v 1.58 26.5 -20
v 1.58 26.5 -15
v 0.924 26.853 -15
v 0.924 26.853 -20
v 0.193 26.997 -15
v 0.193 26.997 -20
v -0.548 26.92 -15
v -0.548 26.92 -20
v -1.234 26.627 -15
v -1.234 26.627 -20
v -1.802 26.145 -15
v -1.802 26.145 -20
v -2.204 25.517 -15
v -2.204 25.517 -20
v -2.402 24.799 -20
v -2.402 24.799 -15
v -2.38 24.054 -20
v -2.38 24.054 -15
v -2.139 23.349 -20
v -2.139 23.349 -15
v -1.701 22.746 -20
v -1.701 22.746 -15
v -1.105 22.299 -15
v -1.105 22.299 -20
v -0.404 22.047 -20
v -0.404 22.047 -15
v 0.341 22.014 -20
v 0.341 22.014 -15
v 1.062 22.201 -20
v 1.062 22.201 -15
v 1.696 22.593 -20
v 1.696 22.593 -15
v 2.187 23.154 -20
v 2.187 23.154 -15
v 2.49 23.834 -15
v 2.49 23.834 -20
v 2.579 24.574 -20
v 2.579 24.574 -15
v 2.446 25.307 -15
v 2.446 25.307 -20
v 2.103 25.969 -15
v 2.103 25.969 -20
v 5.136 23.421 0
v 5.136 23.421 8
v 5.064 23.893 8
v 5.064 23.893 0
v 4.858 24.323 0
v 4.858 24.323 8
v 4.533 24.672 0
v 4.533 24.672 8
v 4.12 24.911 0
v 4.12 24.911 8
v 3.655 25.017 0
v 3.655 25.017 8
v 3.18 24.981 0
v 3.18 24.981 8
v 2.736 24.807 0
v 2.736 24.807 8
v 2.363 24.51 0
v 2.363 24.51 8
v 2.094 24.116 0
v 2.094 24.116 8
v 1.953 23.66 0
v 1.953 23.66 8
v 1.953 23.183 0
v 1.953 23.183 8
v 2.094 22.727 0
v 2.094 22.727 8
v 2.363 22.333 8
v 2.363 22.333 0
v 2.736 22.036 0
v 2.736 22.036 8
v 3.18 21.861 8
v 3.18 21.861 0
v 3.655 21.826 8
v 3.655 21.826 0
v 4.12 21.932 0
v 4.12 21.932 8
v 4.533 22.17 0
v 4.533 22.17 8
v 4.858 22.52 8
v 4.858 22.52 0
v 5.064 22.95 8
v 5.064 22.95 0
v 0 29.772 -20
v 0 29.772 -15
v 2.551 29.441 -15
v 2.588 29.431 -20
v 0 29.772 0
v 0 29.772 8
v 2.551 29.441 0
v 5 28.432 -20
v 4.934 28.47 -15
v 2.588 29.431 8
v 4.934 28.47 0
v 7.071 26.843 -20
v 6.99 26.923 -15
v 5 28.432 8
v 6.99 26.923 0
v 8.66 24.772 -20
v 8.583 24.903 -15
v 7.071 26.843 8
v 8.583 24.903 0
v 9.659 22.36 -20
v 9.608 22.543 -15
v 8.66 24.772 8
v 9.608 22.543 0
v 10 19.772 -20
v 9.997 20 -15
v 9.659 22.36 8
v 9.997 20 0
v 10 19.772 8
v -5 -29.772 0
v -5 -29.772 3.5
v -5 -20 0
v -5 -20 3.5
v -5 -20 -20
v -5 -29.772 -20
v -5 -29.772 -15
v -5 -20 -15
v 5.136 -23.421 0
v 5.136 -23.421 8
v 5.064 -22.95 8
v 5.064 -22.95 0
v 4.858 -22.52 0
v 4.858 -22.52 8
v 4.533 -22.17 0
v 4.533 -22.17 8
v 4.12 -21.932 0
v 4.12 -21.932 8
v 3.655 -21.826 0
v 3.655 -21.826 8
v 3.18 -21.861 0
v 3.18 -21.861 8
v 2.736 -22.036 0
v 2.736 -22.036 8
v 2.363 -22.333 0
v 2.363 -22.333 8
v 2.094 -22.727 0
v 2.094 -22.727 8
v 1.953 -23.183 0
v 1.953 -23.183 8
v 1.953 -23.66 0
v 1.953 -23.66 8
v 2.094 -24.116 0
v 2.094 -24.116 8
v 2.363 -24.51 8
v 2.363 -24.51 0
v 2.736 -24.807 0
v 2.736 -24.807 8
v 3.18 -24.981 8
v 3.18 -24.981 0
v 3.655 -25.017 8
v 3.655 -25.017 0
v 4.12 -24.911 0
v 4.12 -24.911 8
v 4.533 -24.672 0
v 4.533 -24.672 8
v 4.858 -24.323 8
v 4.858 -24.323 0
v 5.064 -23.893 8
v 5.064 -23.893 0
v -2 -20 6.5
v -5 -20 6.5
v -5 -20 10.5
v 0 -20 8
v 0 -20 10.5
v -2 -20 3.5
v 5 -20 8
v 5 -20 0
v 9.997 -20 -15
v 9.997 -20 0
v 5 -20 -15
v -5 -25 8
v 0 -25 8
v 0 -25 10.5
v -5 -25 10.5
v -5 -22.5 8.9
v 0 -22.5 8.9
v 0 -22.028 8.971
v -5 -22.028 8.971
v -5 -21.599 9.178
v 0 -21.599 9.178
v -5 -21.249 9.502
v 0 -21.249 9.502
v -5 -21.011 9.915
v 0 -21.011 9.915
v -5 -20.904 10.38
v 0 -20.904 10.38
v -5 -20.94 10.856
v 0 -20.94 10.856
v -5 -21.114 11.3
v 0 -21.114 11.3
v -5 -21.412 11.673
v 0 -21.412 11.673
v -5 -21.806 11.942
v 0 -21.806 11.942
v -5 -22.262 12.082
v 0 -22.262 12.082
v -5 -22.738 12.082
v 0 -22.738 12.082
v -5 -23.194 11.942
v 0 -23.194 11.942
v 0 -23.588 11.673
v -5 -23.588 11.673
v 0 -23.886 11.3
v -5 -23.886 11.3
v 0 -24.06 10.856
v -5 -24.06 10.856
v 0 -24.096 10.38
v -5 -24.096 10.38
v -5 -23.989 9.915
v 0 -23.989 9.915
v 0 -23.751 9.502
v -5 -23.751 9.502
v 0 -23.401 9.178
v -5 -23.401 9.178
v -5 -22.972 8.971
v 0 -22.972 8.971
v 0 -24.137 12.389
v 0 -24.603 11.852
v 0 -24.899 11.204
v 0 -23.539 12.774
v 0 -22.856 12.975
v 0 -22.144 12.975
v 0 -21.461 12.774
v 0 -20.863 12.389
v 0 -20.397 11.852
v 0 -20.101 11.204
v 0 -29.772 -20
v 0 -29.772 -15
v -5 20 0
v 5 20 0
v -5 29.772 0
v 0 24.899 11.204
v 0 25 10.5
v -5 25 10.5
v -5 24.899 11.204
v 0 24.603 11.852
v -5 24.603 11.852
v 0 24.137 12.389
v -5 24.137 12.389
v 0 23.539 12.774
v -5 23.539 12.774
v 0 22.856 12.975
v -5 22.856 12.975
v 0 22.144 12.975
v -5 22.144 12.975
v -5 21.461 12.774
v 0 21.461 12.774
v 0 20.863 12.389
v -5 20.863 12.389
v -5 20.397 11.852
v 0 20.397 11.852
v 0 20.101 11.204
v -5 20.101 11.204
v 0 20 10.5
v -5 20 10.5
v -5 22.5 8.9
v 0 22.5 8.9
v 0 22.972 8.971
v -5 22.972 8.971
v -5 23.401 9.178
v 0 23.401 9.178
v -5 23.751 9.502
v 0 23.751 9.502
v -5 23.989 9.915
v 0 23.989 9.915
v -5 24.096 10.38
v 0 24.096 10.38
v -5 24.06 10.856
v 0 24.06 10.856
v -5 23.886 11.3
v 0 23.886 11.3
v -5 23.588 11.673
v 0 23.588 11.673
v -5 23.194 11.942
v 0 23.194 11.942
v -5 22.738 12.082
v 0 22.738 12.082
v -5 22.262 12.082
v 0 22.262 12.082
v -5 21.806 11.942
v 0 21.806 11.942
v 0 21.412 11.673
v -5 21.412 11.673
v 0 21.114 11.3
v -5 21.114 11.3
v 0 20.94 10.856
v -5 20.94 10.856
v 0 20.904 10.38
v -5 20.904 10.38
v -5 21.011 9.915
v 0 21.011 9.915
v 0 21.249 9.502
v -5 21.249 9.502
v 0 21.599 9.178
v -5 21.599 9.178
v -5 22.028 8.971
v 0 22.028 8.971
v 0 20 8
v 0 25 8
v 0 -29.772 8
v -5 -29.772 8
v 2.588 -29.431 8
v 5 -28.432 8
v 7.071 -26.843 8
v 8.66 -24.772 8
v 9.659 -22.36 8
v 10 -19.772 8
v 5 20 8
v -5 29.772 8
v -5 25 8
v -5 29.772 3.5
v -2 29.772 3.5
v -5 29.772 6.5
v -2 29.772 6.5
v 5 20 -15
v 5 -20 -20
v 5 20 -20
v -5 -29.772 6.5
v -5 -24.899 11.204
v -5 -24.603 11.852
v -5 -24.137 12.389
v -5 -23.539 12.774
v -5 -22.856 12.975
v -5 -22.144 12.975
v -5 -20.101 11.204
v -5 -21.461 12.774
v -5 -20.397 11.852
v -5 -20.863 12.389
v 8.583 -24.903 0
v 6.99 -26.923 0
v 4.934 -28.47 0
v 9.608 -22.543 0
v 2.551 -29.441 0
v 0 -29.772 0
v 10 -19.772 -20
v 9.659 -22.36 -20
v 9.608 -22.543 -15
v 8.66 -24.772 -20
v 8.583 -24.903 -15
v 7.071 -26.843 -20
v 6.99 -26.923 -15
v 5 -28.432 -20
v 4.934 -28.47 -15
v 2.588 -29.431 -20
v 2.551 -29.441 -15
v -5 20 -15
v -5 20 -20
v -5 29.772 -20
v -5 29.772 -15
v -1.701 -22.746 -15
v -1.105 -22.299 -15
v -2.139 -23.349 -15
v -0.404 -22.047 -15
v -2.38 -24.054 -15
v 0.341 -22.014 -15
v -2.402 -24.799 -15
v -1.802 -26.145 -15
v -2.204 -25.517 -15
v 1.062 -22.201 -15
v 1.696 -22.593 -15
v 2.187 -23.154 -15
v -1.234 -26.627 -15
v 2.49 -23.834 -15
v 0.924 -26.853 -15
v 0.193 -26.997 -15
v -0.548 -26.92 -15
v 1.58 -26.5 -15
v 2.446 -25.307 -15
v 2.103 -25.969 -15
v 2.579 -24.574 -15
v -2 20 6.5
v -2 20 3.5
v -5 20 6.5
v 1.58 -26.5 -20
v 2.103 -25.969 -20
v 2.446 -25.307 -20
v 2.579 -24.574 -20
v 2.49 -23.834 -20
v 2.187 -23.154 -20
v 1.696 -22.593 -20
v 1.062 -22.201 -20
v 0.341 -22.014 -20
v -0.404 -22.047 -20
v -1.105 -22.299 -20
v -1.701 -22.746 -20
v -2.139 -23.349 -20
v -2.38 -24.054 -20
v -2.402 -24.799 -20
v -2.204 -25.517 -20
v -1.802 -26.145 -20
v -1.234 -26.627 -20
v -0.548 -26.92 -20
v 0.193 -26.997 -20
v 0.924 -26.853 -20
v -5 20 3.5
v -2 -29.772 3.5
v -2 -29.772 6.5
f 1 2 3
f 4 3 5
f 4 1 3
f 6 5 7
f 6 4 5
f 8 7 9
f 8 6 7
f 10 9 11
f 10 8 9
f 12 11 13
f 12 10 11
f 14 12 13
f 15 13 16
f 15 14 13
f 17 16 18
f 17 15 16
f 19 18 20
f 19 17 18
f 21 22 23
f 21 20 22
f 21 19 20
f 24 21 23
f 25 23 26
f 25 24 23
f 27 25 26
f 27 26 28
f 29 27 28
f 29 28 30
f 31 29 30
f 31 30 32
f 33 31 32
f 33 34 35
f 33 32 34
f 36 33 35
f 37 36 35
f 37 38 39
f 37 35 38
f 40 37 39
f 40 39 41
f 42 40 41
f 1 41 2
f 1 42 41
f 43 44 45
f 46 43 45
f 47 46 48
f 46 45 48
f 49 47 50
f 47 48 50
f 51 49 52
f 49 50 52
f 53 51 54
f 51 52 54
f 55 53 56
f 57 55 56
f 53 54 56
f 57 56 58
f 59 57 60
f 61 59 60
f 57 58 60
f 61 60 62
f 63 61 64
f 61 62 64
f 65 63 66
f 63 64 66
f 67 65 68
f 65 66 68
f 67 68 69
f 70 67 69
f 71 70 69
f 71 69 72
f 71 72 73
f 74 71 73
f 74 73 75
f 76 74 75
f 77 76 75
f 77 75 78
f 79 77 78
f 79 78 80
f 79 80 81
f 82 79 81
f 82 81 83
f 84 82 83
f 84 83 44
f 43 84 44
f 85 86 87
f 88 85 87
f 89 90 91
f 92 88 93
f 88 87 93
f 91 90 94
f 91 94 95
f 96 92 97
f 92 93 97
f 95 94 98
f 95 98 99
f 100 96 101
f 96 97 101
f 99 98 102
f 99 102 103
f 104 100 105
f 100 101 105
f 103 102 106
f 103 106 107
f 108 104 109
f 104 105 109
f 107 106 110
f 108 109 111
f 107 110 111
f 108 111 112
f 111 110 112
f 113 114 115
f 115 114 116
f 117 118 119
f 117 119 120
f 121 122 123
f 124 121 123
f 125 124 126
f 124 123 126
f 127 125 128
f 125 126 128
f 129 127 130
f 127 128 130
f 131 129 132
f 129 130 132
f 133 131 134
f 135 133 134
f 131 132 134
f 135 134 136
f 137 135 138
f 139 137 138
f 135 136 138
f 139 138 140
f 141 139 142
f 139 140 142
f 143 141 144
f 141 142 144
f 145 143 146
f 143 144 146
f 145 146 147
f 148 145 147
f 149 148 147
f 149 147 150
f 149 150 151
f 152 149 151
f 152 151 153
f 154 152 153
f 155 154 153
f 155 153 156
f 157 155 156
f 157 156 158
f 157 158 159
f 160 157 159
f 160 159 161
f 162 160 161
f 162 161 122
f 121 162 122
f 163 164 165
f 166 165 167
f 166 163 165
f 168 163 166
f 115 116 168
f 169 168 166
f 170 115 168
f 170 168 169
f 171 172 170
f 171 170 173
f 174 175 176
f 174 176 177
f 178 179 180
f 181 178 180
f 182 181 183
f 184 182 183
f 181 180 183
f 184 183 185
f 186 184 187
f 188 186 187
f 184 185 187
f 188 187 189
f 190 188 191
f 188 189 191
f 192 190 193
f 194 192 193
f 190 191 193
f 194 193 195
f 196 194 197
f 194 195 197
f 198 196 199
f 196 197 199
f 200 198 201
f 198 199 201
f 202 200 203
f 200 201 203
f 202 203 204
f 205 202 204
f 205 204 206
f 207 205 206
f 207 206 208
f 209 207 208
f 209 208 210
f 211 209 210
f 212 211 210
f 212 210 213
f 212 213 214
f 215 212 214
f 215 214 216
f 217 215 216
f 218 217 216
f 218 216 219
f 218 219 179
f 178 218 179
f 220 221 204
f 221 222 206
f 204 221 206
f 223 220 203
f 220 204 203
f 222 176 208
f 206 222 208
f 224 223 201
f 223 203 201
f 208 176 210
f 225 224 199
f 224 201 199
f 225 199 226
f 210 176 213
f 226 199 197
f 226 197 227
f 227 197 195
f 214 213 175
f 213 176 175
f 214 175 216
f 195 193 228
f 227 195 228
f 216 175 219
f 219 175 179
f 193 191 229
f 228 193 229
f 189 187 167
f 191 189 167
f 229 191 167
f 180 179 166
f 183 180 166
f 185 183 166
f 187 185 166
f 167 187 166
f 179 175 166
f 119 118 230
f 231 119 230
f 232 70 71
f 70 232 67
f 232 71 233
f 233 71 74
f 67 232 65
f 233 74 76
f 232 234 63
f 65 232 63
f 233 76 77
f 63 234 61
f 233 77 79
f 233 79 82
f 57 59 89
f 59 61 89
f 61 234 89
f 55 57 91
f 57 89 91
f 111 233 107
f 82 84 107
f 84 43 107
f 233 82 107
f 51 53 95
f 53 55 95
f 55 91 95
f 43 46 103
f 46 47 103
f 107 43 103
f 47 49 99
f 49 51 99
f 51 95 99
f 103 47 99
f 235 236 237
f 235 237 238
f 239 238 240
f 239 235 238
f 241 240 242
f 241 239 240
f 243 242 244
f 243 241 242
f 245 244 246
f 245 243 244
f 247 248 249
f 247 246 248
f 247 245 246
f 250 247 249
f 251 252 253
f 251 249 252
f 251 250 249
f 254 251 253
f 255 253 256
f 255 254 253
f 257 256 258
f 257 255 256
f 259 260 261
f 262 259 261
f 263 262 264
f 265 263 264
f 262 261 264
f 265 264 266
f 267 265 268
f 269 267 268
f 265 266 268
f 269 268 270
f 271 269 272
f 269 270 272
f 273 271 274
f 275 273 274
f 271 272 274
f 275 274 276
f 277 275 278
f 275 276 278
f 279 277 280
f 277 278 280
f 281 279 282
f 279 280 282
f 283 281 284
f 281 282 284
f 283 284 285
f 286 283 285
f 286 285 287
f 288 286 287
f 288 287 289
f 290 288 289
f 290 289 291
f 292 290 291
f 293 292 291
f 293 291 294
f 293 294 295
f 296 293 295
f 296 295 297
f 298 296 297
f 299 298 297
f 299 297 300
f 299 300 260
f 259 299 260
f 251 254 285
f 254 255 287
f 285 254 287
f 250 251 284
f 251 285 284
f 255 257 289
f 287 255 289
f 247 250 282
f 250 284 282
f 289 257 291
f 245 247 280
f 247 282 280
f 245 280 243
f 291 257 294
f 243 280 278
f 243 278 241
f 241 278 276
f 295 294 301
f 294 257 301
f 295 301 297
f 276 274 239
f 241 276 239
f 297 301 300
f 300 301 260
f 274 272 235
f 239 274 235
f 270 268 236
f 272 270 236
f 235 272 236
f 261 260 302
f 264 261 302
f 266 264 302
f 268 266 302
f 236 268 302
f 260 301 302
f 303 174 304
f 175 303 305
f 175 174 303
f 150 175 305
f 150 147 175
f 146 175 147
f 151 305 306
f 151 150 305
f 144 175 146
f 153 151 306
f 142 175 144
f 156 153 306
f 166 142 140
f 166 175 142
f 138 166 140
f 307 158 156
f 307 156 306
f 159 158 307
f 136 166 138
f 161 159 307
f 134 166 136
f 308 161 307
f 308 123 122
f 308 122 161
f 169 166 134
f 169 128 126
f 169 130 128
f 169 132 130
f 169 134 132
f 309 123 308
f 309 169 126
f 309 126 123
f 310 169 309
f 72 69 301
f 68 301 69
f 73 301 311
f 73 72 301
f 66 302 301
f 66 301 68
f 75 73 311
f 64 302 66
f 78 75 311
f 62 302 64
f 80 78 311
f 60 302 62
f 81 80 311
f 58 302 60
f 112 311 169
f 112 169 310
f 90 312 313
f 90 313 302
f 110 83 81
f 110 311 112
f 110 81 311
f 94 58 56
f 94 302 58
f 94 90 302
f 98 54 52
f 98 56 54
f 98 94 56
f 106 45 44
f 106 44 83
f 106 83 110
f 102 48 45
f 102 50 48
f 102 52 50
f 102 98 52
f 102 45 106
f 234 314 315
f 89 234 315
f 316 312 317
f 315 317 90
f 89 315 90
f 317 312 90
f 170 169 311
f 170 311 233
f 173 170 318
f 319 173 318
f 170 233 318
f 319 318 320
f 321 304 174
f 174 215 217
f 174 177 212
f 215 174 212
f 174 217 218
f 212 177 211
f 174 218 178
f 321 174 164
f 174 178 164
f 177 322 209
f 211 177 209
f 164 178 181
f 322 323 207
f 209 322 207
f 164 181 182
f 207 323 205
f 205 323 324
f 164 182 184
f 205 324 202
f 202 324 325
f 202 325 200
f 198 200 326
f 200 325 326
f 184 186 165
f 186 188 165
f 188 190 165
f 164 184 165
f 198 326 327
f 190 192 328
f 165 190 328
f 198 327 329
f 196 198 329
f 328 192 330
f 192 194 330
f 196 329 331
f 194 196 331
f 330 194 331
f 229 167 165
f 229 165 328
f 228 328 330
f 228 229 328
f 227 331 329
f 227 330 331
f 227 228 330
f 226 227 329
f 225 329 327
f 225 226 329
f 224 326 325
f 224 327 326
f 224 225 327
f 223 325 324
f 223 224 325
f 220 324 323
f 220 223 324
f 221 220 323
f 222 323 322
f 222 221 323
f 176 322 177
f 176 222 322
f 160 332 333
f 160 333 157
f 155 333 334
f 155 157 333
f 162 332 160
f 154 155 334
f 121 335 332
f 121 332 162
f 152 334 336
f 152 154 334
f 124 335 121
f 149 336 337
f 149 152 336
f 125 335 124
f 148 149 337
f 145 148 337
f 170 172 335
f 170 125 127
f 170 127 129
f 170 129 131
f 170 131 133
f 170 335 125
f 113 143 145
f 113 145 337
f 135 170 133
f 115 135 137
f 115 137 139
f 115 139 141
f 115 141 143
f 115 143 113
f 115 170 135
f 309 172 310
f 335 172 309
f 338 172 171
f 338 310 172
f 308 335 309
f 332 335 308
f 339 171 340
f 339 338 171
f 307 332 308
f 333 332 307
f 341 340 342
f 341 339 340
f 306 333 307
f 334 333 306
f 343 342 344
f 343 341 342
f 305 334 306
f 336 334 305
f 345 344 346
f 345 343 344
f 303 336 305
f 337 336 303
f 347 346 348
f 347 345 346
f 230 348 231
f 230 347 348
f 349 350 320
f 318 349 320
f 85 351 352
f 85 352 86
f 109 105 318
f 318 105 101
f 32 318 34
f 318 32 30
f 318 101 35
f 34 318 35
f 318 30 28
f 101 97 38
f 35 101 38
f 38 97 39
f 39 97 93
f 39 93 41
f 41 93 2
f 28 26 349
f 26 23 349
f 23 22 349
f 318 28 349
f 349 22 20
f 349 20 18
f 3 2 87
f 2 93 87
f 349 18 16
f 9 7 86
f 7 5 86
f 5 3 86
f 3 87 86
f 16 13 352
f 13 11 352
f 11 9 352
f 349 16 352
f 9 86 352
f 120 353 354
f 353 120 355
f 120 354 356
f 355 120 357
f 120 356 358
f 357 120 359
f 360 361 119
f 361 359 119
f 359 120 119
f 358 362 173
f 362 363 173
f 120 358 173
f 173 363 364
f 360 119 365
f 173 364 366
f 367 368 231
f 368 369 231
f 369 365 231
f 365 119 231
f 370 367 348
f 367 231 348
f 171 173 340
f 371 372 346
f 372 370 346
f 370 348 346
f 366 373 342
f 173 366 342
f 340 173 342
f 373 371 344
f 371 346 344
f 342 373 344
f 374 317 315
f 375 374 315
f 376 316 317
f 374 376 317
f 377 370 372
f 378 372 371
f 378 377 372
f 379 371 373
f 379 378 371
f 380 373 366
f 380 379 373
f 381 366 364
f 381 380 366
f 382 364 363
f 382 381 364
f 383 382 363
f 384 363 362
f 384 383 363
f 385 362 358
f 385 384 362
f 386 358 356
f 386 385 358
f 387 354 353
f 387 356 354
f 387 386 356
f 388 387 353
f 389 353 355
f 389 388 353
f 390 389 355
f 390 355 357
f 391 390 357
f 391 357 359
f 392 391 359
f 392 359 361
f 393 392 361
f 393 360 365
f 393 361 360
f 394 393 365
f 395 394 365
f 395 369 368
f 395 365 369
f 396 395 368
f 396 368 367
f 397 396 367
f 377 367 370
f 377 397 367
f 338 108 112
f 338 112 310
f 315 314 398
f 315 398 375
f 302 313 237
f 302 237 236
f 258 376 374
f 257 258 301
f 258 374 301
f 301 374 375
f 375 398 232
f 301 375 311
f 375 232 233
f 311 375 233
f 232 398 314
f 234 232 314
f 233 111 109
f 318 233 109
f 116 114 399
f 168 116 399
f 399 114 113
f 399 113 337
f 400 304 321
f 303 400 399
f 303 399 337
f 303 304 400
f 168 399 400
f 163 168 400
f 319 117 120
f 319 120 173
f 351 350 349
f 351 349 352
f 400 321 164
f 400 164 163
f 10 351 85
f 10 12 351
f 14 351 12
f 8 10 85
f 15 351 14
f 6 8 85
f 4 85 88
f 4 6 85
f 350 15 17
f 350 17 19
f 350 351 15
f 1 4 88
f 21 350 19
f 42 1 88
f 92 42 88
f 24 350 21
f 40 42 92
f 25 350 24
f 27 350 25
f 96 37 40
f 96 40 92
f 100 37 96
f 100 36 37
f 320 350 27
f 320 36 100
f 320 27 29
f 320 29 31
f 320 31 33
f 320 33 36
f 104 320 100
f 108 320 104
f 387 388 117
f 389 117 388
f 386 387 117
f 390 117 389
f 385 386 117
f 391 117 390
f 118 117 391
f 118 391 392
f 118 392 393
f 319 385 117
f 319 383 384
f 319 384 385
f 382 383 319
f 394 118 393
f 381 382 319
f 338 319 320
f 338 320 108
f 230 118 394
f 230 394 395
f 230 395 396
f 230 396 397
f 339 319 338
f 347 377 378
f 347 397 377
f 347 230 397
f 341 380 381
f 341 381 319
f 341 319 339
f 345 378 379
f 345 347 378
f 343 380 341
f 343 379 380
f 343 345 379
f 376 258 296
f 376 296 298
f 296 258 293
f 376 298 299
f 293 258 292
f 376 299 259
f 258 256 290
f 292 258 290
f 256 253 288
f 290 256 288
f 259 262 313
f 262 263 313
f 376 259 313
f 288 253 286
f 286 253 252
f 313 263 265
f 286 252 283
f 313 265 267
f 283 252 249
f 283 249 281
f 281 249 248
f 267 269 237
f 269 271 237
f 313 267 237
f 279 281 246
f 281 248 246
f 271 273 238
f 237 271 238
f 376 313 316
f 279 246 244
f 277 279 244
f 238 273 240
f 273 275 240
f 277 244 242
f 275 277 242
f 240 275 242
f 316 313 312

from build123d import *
from build123d.topology import SkipClean

# Parameters (mm, degrees)
BOSS_EXTRUDE1_DEPTH = 8
SKETCH2_W           = 20
SKETCH2_H           = 40
BOSS_EXTRUDE2_DEPTH = 5
SKETCH3_W           = 5
SKETCH3_H           = 5
BOSS_EXTRUDE3_DEPTH = 5
FILLET2_RADIUS      = 2.5
FILLET2_LENGTH      = 5
FILLET3_RADIUS      = 2.5
FILLET3_LENGTH      = 5
SKETCH6_R           = 1.6
CUT_EXTRUDE3_DEPTH  = 34.541019662
BOSS_EXTRUDE4_DEPTH = 5
BOSS_EXTRUDE5_DEPTH = 5
SKETCH11_W          = 15
SKETCH11_H          = 4.771622141
BOSS_EXTRUDE6_DEPTH = 8
FILLET4_R           = 10
FILLET5_START       = -21
FILLET5_DEPTH       = 30
SKETCH12_R          = 1.6
CUT_EXTRUDE4_DEPTH  = 10
SKETCH15_W          = 6
SKETCH15_H          = 3
CUT_EXTRUDE7_DEPTH  = 20
SKETCH17_W          = 6
SKETCH17_H          = 3
CUT_EXTRUDE8_DEPTH  = 20


with BuildPart() as part:
    # Sketch1 → Boss-Extrude1 (new body)
    with BuildSketch(Plane.XY):
        Polygon((-5, 25), (10, 25), (10, -25), (-5, -25), (-5, -20), (5, -20), (5, 20), (-5, 20), align=None)
    extrude(amount=BOSS_EXTRUDE1_DEPTH)

    # Sketch2 → Boss-Extrude2 (add)
    with BuildSketch(Plane(origin=(10, 0, 0), x_dir=(0, 0, -1), z_dir=(1, 0, 0))):
        with Locations((10, 0)):
            Rectangle(SKETCH2_W, SKETCH2_H)
    extrude(amount=-BOSS_EXTRUDE2_DEPTH)

    # Sketch3 → Boss-Extrude3 (add)
    with BuildSketch(Plane.XY.offset(8)):
        with Locations((-2.5, 22.5)):
            Rectangle(SKETCH3_W, SKETCH3_H)
        with Locations((-2.5, -22.5)):
            Rectangle(SKETCH3_W, SKETCH3_H)
    extrude(amount=BOSS_EXTRUDE3_DEPTH)

    # Fillet2: full round fillet: the end face becomes a half cylinder, R = half its width
    fillet2_face = Plane((-2.5, 22.5, 13), x_dir=(1, 0, 0), z_dir=(0, 0, 1))  # on the end face: x along it, z out of the body
    fillet2_slab = fillet2_face.offset(-FILLET2_RADIUS / 2) * Box(FILLET2_LENGTH, 2 * FILLET2_RADIUS, FILLET2_RADIUS, mode=Mode.PRIVATE)  # the body's end, R deep
    fillet2_round = Plane((-2.5, 22.5, 10.5), x_dir=(0, 0, 1), z_dir=(1, 0, 0)) * Cylinder(FILLET2_RADIUS, FILLET2_LENGTH, mode=Mode.PRIVATE)  # its axis R under the face
    add(fillet2_slab - fillet2_round, mode=Mode.SUBTRACT)

    # Fillet3: full round fillet: the end face becomes a half cylinder, R = half its width
    fillet3_face = Plane((-2.5, -22.5, 13), x_dir=(1, 0, 0), z_dir=(0, 0, 1))  # on the end face: x along it, z out of the body
    fillet3_slab = fillet3_face.offset(-FILLET3_RADIUS / 2) * Box(FILLET3_LENGTH, 2 * FILLET3_RADIUS, FILLET3_RADIUS, mode=Mode.PRIVATE)  # the body's end, R deep
    fillet3_round = Plane((-2.5, -22.5, 10.5), x_dir=(0, 0, 1), z_dir=(1, 0, 0)) * Cylinder(FILLET3_RADIUS, FILLET3_LENGTH, mode=Mode.PRIVATE)  # its axis R under the face
    add(fillet3_slab - fillet3_round, mode=Mode.SUBTRACT)

    # Sketch6 → Cut-Extrude3 (cut, through all)
    with BuildSketch(Plane(origin=(0, 0, 0), x_dir=(0, 0, -1), z_dir=(1, 0, 0))):
        with Locations((-10.5, 22.5)):
            Circle(SKETCH6_R)
        with Locations((-10.5, -22.5)):
            Circle(SKETCH6_R)
    extrude(amount=-CUT_EXTRUDE3_DEPTH, mode=Mode.SUBTRACT)

    # Sketch7 → Boss-Extrude4 (add)
    with BuildSketch(Plane(origin=(0, 0, -20), x_dir=(-1, 0, 0), z_dir=(0, 0, -1))):
        with BuildLine():
            Line((5, 27.3), (5, 20))
            Line((5, 20), (-5, 20))
            Line((-5, 20), (-10, 20))
            Line((-10, 20), (-10, 27.3))
            Line((-10, 27.3), (-1.58, 27.3))
            Line((-1.58, 27.3), (-1.58, 26.5))
            ThreePointArc((-1.58, 26.5), (-0.08, 22), (1.42, 26.5))
            Line((1.42, 26.5), (1.42, 27.3))
            Line((1.42, 27.3), (5, 27.3))
        make_face()
    boss_extrude4 = extrude(amount=-BOSS_EXTRUDE4_DEPTH)

    # Mirror3: Boss-Extrude4 across plane
    add(boss_extrude4.mirror(Plane.ZX))

    # Sketch10 → Boss-Extrude5 (add)
    with SkipClean():  # the faces are left unmerged after this step: merging them gives an invalid solid
        with BuildSketch(Plane(origin=(0, 0, -20), x_dir=(-1, 0, 0), z_dir=(0, 0, -1))):
            with BuildLine():
                Line((5, 29.771622141), (-10, 29.771622141))
                Line((-10, 29.771622141), (-10, 27.3))
                Line((-10, 27.3), (-1.58, 27.3))
                Line((-1.58, 27.3), (-1.58, 26.5))
                ThreePointArc((-1.58, 26.5), (-0.08, 27), (1.42, 26.5))
                Line((1.42, 26.5), (1.42, 27.3))
                Line((1.42, 27.3), (5, 27.3))
                Line((5, 27.3), (5, 29.771622141))
            make_face()
        boss_extrude5 = extrude(amount=-BOSS_EXTRUDE5_DEPTH)

    # Mirror4: Boss-Extrude5 across plane
    with SkipClean():  # the faces are left unmerged after this step: merging them gives an invalid solid
        add(boss_extrude5.mirror(Plane.ZX))

    # Sketch11 → Boss-Extrude6 (add)
    with SkipClean():  # the faces are left unmerged after this step: merging them gives an invalid solid
        with BuildSketch(Plane.XY.offset(8)):
            with Locations((2.5, 27.385811071)):
                Rectangle(SKETCH11_W, SKETCH11_H)
            with Locations((2.5, -27.385811071)):
                Rectangle(SKETCH11_W, SKETCH11_H)
        extrude(amount=-BOSS_EXTRUDE6_DEPTH)

    # Fillet4
    # the kernel refuses this fillet: 10 mm, written as the material it takes off along each edge
    with BuildSketch(Plane(origin=(10, 29.771622141, 33), x_dir=(0, -1, 0), z_dir=(0, 0, -1))) as fillet4_piece_1:
        with BuildLine():
            CenterArc((FILLET4_R, FILLET4_R), FILLET4_R, 180, 90)
            Line((0, FILLET4_R), (0, 0))
            Line((0, 0), (FILLET4_R, 0))
        make_face()
    extrude(amount=58, mode=Mode.SUBTRACT)

    # Fillet5: read off the stored shape, not the designer's step
    # Fillet5 outline → Fillet5 (cut)
    with BuildSketch(Plane.XY.offset(FILLET5_START)):
        with BuildLine():
            Line((10, -29.771622141), (10, -19.771622141))
            ThreePointArc((10, -19.771622141), (7.071067812, -26.842689953), (0, -29.771622141))
            Line((0, -29.771622141), (10, -29.771622141))
        make_face()
    extrude(amount=FILLET5_DEPTH, mode=Mode.SUBTRACT)

    # Sketch12 → Cut-Extrude4 (cut)
    with BuildSketch(Plane.XY.offset(8)):
        with Locations((3.535533906, 23.421344977)):
            Circle(SKETCH12_R)
        with Locations((3.535533906, -23.421344977)):
            Circle(SKETCH12_R)
    extrude(amount=-CUT_EXTRUDE4_DEPTH, mode=Mode.SUBTRACT)

    # Sketch15 → Cut-Extrude7 (cut)
    with BuildSketch(Plane.XZ.offset(29.771622141)):
        with Locations((-5, 5)):
            Rectangle(SKETCH15_W, SKETCH15_H)
    extrude(amount=-CUT_EXTRUDE7_DEPTH, mode=Mode.SUBTRACT)

    # Sketch17 → Cut-Extrude8 (cut)
    with BuildSketch(Plane(origin=(0, 29.771622141, 0), x_dir=(1, 0, 0), z_dir=(0, 1, 0))):
        with Locations((-5, -5)):
            Rectangle(SKETCH17_W, SKETCH17_H)
    extrude(amount=-CUT_EXTRUDE8_DEPTH, mode=Mode.SUBTRACT)


solid = part.part
